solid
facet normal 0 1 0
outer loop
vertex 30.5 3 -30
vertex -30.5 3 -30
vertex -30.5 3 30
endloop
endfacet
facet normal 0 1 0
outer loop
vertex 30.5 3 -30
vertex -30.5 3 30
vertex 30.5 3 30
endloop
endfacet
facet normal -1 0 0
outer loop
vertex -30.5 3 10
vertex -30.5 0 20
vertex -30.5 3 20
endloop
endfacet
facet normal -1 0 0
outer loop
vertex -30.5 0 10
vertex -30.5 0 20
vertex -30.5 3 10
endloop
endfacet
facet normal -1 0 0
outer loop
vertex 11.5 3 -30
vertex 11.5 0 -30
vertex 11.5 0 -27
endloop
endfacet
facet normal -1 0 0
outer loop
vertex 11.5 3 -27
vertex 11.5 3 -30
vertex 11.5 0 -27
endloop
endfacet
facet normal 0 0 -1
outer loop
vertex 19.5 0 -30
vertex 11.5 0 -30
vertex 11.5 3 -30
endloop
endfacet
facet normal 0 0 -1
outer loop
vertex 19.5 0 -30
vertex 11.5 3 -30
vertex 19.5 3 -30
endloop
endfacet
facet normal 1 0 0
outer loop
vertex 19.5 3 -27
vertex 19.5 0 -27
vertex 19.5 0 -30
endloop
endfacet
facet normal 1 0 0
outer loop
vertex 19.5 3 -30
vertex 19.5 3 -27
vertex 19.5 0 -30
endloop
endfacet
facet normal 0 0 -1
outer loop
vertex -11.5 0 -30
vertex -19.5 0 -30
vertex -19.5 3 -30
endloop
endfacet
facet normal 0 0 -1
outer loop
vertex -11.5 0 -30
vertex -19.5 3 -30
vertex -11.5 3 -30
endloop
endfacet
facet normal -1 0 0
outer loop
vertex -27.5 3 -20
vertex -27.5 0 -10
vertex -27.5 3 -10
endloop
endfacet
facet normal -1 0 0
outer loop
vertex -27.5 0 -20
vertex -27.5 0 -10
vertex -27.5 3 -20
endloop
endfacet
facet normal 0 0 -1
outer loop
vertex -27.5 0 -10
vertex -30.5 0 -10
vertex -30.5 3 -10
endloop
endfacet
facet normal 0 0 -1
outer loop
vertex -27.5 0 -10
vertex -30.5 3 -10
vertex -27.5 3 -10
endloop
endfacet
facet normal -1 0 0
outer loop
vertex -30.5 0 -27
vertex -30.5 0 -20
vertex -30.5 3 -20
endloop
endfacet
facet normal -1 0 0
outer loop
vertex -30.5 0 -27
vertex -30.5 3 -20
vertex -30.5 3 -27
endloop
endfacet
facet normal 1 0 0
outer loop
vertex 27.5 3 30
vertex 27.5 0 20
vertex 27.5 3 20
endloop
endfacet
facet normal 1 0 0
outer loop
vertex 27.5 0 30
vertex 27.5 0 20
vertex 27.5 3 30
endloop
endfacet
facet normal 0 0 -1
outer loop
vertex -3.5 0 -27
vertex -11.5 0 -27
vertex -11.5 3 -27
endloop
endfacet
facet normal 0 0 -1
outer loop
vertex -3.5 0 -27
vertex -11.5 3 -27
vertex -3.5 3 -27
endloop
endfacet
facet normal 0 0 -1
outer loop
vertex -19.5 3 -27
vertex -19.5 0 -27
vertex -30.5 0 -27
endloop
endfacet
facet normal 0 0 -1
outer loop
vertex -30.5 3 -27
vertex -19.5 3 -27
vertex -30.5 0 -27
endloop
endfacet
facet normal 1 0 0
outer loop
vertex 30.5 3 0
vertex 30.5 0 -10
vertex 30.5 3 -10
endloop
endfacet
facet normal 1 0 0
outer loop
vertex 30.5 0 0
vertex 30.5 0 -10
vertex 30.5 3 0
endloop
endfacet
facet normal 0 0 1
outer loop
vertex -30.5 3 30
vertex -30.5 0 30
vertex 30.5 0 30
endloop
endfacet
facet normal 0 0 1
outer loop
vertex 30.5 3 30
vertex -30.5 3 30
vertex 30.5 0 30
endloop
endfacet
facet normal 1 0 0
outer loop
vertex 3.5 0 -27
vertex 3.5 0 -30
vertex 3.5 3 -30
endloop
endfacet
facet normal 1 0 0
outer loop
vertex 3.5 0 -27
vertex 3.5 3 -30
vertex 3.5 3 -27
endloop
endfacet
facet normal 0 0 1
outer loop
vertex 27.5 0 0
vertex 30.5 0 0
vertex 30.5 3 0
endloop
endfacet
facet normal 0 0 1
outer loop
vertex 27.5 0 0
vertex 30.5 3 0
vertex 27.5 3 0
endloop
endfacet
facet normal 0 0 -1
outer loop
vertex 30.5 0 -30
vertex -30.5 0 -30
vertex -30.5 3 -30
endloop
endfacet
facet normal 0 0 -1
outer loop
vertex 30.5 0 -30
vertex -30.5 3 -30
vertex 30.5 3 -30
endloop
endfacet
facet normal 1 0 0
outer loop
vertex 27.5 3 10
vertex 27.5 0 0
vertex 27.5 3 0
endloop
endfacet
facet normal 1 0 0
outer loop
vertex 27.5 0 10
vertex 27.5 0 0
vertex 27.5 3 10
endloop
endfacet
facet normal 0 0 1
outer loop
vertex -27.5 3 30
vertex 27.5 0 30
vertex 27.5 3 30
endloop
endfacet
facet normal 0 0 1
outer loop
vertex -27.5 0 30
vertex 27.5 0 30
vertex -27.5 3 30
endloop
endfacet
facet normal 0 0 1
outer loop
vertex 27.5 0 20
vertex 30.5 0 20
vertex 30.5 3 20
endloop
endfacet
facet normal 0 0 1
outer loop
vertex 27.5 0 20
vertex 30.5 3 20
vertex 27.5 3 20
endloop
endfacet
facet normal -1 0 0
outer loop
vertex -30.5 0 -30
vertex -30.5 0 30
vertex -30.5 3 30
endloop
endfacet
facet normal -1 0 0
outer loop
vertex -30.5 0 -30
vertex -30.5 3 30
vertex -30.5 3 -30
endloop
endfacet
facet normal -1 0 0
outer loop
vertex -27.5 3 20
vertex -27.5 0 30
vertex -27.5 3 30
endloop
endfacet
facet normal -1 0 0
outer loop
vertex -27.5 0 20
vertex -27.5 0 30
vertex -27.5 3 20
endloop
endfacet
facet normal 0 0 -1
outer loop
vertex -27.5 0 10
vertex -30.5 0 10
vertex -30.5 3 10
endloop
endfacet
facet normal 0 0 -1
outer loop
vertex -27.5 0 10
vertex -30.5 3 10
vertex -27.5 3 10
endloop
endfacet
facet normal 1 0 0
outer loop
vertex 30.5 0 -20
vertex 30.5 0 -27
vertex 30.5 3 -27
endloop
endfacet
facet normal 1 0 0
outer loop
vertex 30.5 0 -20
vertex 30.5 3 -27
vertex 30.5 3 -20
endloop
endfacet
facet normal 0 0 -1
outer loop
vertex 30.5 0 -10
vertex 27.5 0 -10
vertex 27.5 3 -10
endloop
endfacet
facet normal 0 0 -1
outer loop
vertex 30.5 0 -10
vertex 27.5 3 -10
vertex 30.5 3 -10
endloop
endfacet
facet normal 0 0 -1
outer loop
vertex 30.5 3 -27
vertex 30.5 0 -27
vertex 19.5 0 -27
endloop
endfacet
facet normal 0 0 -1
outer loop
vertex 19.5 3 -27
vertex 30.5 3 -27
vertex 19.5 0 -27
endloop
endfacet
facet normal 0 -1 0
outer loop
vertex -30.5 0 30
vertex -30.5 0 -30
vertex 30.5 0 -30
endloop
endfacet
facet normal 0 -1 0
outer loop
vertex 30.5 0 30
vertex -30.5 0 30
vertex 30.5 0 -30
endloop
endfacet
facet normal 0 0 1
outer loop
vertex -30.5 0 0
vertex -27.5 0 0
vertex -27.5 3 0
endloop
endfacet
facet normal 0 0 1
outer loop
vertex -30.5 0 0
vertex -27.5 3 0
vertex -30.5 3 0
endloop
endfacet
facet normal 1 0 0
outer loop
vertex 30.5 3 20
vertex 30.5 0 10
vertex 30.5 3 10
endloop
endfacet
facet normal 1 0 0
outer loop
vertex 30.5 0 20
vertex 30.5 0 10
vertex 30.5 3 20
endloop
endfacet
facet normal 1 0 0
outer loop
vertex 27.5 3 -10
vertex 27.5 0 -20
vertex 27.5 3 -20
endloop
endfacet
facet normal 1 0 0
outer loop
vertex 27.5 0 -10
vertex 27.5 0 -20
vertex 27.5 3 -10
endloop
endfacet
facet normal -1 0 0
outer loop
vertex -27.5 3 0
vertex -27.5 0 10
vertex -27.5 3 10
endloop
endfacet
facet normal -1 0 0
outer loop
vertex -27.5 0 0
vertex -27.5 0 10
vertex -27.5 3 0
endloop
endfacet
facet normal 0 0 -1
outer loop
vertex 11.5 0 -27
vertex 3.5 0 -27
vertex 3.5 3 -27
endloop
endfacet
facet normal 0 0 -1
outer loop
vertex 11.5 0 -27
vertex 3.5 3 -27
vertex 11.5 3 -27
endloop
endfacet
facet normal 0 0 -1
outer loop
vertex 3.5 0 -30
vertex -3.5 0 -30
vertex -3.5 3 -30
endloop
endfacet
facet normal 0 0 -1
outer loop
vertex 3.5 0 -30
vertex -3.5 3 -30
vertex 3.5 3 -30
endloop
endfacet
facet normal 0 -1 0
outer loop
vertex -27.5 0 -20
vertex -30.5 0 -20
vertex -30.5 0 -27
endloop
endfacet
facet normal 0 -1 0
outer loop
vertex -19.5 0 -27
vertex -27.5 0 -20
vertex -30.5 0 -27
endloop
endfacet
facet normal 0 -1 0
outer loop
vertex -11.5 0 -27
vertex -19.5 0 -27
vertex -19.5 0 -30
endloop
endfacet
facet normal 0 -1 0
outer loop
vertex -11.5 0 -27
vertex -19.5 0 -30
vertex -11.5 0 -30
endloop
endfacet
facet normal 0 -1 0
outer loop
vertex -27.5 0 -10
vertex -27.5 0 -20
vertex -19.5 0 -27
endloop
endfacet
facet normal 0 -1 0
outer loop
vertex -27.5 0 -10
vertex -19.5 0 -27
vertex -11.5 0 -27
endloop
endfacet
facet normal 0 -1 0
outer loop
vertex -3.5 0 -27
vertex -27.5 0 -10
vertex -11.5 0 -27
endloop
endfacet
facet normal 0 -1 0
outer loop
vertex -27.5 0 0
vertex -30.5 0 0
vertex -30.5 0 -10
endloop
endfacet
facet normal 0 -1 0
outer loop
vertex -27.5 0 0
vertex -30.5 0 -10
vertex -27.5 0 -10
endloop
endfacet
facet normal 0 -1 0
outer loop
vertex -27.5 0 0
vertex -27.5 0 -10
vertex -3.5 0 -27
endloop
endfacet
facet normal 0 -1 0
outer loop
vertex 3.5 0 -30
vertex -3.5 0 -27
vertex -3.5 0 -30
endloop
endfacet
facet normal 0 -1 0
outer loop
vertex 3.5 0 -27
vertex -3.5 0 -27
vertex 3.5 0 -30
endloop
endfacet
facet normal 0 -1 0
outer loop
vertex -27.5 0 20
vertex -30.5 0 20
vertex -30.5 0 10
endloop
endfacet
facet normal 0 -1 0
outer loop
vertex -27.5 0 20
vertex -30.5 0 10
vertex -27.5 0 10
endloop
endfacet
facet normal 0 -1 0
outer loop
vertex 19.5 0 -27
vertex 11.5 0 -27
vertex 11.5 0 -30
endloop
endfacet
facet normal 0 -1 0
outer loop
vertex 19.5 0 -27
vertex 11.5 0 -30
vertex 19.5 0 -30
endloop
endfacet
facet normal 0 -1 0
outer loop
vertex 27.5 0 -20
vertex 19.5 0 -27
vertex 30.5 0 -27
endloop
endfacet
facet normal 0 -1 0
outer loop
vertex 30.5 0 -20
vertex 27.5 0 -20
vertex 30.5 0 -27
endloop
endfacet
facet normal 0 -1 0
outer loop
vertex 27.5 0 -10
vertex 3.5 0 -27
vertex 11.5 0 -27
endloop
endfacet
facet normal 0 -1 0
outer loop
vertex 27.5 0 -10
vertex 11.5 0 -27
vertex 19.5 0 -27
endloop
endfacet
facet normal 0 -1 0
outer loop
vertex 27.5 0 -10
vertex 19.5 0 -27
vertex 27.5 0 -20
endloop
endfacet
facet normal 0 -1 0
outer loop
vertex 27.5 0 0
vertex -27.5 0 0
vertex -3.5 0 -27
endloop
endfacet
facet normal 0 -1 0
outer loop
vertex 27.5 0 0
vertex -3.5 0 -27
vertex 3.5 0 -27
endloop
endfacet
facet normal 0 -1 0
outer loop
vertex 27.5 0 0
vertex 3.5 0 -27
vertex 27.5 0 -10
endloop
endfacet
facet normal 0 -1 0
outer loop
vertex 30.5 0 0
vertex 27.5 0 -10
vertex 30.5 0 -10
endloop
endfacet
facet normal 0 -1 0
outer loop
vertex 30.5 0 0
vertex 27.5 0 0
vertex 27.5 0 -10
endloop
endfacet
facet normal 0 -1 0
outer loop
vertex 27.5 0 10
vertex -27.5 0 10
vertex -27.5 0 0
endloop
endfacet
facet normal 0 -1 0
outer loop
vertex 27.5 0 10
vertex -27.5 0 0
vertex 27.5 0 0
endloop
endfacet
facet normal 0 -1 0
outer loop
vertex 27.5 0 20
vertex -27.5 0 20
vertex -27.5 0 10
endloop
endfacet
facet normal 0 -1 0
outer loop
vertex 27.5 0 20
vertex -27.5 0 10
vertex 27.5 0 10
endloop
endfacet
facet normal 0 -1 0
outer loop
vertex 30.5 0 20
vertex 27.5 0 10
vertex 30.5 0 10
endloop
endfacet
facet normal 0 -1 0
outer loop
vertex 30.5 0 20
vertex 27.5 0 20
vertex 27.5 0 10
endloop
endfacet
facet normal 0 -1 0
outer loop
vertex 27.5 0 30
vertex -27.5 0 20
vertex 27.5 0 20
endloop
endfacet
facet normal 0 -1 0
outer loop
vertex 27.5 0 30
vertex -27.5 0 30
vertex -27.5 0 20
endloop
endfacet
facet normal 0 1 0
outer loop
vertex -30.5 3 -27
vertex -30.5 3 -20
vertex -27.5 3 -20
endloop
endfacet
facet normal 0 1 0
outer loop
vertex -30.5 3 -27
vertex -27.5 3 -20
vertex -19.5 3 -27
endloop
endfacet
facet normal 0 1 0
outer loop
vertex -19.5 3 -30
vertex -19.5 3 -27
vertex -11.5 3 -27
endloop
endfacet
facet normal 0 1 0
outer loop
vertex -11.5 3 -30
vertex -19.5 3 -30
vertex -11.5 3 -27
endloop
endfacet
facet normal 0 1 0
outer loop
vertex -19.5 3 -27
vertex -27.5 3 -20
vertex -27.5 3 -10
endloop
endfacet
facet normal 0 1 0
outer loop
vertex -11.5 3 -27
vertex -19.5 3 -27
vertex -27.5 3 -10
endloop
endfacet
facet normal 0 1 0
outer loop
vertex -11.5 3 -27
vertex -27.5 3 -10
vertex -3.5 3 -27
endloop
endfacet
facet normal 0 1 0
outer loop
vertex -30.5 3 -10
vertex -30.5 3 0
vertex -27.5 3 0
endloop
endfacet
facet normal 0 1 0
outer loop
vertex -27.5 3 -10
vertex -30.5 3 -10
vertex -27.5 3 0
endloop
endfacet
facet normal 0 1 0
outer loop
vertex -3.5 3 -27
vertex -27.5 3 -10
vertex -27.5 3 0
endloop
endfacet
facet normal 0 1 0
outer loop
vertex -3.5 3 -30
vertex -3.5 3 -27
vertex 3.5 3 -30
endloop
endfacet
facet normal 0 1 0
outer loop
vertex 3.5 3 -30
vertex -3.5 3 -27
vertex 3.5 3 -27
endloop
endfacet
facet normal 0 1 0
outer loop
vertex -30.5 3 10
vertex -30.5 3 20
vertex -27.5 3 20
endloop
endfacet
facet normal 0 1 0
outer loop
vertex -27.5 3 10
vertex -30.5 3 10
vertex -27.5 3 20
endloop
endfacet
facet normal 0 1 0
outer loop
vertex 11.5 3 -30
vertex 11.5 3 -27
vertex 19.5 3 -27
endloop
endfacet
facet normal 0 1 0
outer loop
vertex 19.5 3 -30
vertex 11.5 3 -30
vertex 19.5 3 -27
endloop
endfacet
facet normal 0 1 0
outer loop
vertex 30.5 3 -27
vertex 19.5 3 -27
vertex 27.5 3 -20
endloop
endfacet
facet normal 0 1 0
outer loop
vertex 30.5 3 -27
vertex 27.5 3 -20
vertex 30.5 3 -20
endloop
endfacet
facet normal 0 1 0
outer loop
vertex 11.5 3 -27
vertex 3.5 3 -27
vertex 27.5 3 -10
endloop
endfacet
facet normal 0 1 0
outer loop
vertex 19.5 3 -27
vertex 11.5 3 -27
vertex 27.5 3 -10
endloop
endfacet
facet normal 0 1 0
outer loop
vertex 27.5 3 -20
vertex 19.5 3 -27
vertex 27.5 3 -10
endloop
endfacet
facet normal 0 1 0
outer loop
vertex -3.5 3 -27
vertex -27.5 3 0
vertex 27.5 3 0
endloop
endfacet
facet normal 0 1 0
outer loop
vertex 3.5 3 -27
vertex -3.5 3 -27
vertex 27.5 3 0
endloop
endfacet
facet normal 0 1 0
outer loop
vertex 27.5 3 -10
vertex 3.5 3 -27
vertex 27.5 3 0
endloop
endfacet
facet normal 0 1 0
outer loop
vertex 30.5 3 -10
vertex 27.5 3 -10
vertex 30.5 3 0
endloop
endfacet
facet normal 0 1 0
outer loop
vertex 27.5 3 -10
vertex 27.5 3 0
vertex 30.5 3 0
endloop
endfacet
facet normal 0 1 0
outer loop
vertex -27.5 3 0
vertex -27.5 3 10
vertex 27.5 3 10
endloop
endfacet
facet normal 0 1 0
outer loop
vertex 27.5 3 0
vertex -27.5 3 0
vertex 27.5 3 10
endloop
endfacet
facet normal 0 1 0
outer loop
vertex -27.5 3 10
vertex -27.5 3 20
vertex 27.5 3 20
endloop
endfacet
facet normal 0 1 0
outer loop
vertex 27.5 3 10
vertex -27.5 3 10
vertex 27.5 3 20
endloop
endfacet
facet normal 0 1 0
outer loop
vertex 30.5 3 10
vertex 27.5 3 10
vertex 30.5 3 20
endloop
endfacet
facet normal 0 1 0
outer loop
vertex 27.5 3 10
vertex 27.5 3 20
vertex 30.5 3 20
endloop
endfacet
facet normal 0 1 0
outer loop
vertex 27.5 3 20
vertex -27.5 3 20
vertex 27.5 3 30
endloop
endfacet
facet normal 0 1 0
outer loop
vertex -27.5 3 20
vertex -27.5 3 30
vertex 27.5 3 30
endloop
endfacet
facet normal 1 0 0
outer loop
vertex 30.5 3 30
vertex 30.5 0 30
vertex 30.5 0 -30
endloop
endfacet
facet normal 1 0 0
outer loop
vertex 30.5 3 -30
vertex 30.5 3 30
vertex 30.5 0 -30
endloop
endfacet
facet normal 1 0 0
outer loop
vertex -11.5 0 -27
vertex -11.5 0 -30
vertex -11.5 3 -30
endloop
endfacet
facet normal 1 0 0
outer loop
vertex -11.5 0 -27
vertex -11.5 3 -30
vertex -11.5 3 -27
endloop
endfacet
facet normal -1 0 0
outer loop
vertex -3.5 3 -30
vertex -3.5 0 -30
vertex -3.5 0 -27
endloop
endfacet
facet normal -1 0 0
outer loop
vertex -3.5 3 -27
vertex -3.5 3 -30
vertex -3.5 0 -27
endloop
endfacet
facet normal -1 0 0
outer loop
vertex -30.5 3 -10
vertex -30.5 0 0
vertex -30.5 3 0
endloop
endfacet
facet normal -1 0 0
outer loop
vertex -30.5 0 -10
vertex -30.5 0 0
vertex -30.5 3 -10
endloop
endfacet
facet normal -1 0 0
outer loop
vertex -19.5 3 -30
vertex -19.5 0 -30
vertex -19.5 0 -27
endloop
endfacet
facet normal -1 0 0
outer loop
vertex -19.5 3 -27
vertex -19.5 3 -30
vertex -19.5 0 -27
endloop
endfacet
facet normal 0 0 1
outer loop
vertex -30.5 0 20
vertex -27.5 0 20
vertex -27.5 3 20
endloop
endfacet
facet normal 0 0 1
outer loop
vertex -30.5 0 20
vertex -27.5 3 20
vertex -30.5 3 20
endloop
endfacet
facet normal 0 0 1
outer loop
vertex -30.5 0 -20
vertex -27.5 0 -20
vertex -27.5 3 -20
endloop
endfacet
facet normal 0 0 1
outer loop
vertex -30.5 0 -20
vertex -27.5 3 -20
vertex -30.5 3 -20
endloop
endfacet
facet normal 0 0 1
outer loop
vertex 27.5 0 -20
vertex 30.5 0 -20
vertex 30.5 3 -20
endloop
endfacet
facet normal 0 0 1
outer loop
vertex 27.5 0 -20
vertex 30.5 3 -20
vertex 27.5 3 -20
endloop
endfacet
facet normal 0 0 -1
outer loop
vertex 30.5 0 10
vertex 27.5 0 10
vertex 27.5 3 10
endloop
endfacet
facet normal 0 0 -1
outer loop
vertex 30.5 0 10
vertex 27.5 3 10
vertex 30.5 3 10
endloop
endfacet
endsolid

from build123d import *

# Parameters (mm, degrees)
SKETCH1_W           = 61
SKETCH1_H           = 60
BOSS_EXTRUDE1_DEPTH = 3
BOSS_EXTRUDE2_DEPTH = 3
SKETCH3_W           = 8
SKETCH3_H           = 3
CUT_EXTRUDE1_DEPTH  = 3


with BuildPart() as part:
    # Sketch1 → Boss-Extrude1 (new body)
    with BuildSketch(Plane(origin=(0, 0, 0), x_dir=(1, 0, 0), z_dir=(0, 1, 0))):
        Rectangle(SKETCH1_W, SKETCH1_H)
    extrude(amount=BOSS_EXTRUDE1_DEPTH)


with BuildPart() as body_2:
    # Sketch2 → Boss-Extrude2 (new body)
    with BuildSketch(Plane.XZ):
        Polygon((-30.5, -30), (30.5, -30), (30.5, -20), (27.5, -20), (27.5, -10), (30.5, -10), (30.5, 0), (27.5, 0), (27.5, 10), (30.5, 10), (30.5, 20), (27.5, 20), (27.5, 30), (-27.5, 30), (-27.5, 20), (-30.5, 20), (-30.5, 10), (-27.5, 10), (-27.5, 0), (-30.5, 0), (-30.5, -10), (-27.5, -10), (-27.5, -20), (-30.5, -20), align=None)
    extrude(amount=-BOSS_EXTRUDE2_DEPTH)

    # Sketch3 → Cut-Extrude1 (cut)
    with BuildSketch(Plane.XZ):
        Polygon((27.5, -27), (19.5, -27), (19.5, -30), (30.5, -30), (30.5, -27), align=None)
        with Locations((7.5, -28.5)):
            Rectangle(SKETCH3_W, SKETCH3_H)
        with Locations((-7.5, -28.5)):
            Rectangle(SKETCH3_W, SKETCH3_H)
        Polygon((-19.5, -27), (-27.5, -27), (-30.5, -27), (-30.5, -30), (-19.5, -30), align=None)
    extrude(amount=-CUT_EXTRUDE1_DEPTH, mode=Mode.SUBTRACT)


solid = Compound([part.part, body_2.part])
